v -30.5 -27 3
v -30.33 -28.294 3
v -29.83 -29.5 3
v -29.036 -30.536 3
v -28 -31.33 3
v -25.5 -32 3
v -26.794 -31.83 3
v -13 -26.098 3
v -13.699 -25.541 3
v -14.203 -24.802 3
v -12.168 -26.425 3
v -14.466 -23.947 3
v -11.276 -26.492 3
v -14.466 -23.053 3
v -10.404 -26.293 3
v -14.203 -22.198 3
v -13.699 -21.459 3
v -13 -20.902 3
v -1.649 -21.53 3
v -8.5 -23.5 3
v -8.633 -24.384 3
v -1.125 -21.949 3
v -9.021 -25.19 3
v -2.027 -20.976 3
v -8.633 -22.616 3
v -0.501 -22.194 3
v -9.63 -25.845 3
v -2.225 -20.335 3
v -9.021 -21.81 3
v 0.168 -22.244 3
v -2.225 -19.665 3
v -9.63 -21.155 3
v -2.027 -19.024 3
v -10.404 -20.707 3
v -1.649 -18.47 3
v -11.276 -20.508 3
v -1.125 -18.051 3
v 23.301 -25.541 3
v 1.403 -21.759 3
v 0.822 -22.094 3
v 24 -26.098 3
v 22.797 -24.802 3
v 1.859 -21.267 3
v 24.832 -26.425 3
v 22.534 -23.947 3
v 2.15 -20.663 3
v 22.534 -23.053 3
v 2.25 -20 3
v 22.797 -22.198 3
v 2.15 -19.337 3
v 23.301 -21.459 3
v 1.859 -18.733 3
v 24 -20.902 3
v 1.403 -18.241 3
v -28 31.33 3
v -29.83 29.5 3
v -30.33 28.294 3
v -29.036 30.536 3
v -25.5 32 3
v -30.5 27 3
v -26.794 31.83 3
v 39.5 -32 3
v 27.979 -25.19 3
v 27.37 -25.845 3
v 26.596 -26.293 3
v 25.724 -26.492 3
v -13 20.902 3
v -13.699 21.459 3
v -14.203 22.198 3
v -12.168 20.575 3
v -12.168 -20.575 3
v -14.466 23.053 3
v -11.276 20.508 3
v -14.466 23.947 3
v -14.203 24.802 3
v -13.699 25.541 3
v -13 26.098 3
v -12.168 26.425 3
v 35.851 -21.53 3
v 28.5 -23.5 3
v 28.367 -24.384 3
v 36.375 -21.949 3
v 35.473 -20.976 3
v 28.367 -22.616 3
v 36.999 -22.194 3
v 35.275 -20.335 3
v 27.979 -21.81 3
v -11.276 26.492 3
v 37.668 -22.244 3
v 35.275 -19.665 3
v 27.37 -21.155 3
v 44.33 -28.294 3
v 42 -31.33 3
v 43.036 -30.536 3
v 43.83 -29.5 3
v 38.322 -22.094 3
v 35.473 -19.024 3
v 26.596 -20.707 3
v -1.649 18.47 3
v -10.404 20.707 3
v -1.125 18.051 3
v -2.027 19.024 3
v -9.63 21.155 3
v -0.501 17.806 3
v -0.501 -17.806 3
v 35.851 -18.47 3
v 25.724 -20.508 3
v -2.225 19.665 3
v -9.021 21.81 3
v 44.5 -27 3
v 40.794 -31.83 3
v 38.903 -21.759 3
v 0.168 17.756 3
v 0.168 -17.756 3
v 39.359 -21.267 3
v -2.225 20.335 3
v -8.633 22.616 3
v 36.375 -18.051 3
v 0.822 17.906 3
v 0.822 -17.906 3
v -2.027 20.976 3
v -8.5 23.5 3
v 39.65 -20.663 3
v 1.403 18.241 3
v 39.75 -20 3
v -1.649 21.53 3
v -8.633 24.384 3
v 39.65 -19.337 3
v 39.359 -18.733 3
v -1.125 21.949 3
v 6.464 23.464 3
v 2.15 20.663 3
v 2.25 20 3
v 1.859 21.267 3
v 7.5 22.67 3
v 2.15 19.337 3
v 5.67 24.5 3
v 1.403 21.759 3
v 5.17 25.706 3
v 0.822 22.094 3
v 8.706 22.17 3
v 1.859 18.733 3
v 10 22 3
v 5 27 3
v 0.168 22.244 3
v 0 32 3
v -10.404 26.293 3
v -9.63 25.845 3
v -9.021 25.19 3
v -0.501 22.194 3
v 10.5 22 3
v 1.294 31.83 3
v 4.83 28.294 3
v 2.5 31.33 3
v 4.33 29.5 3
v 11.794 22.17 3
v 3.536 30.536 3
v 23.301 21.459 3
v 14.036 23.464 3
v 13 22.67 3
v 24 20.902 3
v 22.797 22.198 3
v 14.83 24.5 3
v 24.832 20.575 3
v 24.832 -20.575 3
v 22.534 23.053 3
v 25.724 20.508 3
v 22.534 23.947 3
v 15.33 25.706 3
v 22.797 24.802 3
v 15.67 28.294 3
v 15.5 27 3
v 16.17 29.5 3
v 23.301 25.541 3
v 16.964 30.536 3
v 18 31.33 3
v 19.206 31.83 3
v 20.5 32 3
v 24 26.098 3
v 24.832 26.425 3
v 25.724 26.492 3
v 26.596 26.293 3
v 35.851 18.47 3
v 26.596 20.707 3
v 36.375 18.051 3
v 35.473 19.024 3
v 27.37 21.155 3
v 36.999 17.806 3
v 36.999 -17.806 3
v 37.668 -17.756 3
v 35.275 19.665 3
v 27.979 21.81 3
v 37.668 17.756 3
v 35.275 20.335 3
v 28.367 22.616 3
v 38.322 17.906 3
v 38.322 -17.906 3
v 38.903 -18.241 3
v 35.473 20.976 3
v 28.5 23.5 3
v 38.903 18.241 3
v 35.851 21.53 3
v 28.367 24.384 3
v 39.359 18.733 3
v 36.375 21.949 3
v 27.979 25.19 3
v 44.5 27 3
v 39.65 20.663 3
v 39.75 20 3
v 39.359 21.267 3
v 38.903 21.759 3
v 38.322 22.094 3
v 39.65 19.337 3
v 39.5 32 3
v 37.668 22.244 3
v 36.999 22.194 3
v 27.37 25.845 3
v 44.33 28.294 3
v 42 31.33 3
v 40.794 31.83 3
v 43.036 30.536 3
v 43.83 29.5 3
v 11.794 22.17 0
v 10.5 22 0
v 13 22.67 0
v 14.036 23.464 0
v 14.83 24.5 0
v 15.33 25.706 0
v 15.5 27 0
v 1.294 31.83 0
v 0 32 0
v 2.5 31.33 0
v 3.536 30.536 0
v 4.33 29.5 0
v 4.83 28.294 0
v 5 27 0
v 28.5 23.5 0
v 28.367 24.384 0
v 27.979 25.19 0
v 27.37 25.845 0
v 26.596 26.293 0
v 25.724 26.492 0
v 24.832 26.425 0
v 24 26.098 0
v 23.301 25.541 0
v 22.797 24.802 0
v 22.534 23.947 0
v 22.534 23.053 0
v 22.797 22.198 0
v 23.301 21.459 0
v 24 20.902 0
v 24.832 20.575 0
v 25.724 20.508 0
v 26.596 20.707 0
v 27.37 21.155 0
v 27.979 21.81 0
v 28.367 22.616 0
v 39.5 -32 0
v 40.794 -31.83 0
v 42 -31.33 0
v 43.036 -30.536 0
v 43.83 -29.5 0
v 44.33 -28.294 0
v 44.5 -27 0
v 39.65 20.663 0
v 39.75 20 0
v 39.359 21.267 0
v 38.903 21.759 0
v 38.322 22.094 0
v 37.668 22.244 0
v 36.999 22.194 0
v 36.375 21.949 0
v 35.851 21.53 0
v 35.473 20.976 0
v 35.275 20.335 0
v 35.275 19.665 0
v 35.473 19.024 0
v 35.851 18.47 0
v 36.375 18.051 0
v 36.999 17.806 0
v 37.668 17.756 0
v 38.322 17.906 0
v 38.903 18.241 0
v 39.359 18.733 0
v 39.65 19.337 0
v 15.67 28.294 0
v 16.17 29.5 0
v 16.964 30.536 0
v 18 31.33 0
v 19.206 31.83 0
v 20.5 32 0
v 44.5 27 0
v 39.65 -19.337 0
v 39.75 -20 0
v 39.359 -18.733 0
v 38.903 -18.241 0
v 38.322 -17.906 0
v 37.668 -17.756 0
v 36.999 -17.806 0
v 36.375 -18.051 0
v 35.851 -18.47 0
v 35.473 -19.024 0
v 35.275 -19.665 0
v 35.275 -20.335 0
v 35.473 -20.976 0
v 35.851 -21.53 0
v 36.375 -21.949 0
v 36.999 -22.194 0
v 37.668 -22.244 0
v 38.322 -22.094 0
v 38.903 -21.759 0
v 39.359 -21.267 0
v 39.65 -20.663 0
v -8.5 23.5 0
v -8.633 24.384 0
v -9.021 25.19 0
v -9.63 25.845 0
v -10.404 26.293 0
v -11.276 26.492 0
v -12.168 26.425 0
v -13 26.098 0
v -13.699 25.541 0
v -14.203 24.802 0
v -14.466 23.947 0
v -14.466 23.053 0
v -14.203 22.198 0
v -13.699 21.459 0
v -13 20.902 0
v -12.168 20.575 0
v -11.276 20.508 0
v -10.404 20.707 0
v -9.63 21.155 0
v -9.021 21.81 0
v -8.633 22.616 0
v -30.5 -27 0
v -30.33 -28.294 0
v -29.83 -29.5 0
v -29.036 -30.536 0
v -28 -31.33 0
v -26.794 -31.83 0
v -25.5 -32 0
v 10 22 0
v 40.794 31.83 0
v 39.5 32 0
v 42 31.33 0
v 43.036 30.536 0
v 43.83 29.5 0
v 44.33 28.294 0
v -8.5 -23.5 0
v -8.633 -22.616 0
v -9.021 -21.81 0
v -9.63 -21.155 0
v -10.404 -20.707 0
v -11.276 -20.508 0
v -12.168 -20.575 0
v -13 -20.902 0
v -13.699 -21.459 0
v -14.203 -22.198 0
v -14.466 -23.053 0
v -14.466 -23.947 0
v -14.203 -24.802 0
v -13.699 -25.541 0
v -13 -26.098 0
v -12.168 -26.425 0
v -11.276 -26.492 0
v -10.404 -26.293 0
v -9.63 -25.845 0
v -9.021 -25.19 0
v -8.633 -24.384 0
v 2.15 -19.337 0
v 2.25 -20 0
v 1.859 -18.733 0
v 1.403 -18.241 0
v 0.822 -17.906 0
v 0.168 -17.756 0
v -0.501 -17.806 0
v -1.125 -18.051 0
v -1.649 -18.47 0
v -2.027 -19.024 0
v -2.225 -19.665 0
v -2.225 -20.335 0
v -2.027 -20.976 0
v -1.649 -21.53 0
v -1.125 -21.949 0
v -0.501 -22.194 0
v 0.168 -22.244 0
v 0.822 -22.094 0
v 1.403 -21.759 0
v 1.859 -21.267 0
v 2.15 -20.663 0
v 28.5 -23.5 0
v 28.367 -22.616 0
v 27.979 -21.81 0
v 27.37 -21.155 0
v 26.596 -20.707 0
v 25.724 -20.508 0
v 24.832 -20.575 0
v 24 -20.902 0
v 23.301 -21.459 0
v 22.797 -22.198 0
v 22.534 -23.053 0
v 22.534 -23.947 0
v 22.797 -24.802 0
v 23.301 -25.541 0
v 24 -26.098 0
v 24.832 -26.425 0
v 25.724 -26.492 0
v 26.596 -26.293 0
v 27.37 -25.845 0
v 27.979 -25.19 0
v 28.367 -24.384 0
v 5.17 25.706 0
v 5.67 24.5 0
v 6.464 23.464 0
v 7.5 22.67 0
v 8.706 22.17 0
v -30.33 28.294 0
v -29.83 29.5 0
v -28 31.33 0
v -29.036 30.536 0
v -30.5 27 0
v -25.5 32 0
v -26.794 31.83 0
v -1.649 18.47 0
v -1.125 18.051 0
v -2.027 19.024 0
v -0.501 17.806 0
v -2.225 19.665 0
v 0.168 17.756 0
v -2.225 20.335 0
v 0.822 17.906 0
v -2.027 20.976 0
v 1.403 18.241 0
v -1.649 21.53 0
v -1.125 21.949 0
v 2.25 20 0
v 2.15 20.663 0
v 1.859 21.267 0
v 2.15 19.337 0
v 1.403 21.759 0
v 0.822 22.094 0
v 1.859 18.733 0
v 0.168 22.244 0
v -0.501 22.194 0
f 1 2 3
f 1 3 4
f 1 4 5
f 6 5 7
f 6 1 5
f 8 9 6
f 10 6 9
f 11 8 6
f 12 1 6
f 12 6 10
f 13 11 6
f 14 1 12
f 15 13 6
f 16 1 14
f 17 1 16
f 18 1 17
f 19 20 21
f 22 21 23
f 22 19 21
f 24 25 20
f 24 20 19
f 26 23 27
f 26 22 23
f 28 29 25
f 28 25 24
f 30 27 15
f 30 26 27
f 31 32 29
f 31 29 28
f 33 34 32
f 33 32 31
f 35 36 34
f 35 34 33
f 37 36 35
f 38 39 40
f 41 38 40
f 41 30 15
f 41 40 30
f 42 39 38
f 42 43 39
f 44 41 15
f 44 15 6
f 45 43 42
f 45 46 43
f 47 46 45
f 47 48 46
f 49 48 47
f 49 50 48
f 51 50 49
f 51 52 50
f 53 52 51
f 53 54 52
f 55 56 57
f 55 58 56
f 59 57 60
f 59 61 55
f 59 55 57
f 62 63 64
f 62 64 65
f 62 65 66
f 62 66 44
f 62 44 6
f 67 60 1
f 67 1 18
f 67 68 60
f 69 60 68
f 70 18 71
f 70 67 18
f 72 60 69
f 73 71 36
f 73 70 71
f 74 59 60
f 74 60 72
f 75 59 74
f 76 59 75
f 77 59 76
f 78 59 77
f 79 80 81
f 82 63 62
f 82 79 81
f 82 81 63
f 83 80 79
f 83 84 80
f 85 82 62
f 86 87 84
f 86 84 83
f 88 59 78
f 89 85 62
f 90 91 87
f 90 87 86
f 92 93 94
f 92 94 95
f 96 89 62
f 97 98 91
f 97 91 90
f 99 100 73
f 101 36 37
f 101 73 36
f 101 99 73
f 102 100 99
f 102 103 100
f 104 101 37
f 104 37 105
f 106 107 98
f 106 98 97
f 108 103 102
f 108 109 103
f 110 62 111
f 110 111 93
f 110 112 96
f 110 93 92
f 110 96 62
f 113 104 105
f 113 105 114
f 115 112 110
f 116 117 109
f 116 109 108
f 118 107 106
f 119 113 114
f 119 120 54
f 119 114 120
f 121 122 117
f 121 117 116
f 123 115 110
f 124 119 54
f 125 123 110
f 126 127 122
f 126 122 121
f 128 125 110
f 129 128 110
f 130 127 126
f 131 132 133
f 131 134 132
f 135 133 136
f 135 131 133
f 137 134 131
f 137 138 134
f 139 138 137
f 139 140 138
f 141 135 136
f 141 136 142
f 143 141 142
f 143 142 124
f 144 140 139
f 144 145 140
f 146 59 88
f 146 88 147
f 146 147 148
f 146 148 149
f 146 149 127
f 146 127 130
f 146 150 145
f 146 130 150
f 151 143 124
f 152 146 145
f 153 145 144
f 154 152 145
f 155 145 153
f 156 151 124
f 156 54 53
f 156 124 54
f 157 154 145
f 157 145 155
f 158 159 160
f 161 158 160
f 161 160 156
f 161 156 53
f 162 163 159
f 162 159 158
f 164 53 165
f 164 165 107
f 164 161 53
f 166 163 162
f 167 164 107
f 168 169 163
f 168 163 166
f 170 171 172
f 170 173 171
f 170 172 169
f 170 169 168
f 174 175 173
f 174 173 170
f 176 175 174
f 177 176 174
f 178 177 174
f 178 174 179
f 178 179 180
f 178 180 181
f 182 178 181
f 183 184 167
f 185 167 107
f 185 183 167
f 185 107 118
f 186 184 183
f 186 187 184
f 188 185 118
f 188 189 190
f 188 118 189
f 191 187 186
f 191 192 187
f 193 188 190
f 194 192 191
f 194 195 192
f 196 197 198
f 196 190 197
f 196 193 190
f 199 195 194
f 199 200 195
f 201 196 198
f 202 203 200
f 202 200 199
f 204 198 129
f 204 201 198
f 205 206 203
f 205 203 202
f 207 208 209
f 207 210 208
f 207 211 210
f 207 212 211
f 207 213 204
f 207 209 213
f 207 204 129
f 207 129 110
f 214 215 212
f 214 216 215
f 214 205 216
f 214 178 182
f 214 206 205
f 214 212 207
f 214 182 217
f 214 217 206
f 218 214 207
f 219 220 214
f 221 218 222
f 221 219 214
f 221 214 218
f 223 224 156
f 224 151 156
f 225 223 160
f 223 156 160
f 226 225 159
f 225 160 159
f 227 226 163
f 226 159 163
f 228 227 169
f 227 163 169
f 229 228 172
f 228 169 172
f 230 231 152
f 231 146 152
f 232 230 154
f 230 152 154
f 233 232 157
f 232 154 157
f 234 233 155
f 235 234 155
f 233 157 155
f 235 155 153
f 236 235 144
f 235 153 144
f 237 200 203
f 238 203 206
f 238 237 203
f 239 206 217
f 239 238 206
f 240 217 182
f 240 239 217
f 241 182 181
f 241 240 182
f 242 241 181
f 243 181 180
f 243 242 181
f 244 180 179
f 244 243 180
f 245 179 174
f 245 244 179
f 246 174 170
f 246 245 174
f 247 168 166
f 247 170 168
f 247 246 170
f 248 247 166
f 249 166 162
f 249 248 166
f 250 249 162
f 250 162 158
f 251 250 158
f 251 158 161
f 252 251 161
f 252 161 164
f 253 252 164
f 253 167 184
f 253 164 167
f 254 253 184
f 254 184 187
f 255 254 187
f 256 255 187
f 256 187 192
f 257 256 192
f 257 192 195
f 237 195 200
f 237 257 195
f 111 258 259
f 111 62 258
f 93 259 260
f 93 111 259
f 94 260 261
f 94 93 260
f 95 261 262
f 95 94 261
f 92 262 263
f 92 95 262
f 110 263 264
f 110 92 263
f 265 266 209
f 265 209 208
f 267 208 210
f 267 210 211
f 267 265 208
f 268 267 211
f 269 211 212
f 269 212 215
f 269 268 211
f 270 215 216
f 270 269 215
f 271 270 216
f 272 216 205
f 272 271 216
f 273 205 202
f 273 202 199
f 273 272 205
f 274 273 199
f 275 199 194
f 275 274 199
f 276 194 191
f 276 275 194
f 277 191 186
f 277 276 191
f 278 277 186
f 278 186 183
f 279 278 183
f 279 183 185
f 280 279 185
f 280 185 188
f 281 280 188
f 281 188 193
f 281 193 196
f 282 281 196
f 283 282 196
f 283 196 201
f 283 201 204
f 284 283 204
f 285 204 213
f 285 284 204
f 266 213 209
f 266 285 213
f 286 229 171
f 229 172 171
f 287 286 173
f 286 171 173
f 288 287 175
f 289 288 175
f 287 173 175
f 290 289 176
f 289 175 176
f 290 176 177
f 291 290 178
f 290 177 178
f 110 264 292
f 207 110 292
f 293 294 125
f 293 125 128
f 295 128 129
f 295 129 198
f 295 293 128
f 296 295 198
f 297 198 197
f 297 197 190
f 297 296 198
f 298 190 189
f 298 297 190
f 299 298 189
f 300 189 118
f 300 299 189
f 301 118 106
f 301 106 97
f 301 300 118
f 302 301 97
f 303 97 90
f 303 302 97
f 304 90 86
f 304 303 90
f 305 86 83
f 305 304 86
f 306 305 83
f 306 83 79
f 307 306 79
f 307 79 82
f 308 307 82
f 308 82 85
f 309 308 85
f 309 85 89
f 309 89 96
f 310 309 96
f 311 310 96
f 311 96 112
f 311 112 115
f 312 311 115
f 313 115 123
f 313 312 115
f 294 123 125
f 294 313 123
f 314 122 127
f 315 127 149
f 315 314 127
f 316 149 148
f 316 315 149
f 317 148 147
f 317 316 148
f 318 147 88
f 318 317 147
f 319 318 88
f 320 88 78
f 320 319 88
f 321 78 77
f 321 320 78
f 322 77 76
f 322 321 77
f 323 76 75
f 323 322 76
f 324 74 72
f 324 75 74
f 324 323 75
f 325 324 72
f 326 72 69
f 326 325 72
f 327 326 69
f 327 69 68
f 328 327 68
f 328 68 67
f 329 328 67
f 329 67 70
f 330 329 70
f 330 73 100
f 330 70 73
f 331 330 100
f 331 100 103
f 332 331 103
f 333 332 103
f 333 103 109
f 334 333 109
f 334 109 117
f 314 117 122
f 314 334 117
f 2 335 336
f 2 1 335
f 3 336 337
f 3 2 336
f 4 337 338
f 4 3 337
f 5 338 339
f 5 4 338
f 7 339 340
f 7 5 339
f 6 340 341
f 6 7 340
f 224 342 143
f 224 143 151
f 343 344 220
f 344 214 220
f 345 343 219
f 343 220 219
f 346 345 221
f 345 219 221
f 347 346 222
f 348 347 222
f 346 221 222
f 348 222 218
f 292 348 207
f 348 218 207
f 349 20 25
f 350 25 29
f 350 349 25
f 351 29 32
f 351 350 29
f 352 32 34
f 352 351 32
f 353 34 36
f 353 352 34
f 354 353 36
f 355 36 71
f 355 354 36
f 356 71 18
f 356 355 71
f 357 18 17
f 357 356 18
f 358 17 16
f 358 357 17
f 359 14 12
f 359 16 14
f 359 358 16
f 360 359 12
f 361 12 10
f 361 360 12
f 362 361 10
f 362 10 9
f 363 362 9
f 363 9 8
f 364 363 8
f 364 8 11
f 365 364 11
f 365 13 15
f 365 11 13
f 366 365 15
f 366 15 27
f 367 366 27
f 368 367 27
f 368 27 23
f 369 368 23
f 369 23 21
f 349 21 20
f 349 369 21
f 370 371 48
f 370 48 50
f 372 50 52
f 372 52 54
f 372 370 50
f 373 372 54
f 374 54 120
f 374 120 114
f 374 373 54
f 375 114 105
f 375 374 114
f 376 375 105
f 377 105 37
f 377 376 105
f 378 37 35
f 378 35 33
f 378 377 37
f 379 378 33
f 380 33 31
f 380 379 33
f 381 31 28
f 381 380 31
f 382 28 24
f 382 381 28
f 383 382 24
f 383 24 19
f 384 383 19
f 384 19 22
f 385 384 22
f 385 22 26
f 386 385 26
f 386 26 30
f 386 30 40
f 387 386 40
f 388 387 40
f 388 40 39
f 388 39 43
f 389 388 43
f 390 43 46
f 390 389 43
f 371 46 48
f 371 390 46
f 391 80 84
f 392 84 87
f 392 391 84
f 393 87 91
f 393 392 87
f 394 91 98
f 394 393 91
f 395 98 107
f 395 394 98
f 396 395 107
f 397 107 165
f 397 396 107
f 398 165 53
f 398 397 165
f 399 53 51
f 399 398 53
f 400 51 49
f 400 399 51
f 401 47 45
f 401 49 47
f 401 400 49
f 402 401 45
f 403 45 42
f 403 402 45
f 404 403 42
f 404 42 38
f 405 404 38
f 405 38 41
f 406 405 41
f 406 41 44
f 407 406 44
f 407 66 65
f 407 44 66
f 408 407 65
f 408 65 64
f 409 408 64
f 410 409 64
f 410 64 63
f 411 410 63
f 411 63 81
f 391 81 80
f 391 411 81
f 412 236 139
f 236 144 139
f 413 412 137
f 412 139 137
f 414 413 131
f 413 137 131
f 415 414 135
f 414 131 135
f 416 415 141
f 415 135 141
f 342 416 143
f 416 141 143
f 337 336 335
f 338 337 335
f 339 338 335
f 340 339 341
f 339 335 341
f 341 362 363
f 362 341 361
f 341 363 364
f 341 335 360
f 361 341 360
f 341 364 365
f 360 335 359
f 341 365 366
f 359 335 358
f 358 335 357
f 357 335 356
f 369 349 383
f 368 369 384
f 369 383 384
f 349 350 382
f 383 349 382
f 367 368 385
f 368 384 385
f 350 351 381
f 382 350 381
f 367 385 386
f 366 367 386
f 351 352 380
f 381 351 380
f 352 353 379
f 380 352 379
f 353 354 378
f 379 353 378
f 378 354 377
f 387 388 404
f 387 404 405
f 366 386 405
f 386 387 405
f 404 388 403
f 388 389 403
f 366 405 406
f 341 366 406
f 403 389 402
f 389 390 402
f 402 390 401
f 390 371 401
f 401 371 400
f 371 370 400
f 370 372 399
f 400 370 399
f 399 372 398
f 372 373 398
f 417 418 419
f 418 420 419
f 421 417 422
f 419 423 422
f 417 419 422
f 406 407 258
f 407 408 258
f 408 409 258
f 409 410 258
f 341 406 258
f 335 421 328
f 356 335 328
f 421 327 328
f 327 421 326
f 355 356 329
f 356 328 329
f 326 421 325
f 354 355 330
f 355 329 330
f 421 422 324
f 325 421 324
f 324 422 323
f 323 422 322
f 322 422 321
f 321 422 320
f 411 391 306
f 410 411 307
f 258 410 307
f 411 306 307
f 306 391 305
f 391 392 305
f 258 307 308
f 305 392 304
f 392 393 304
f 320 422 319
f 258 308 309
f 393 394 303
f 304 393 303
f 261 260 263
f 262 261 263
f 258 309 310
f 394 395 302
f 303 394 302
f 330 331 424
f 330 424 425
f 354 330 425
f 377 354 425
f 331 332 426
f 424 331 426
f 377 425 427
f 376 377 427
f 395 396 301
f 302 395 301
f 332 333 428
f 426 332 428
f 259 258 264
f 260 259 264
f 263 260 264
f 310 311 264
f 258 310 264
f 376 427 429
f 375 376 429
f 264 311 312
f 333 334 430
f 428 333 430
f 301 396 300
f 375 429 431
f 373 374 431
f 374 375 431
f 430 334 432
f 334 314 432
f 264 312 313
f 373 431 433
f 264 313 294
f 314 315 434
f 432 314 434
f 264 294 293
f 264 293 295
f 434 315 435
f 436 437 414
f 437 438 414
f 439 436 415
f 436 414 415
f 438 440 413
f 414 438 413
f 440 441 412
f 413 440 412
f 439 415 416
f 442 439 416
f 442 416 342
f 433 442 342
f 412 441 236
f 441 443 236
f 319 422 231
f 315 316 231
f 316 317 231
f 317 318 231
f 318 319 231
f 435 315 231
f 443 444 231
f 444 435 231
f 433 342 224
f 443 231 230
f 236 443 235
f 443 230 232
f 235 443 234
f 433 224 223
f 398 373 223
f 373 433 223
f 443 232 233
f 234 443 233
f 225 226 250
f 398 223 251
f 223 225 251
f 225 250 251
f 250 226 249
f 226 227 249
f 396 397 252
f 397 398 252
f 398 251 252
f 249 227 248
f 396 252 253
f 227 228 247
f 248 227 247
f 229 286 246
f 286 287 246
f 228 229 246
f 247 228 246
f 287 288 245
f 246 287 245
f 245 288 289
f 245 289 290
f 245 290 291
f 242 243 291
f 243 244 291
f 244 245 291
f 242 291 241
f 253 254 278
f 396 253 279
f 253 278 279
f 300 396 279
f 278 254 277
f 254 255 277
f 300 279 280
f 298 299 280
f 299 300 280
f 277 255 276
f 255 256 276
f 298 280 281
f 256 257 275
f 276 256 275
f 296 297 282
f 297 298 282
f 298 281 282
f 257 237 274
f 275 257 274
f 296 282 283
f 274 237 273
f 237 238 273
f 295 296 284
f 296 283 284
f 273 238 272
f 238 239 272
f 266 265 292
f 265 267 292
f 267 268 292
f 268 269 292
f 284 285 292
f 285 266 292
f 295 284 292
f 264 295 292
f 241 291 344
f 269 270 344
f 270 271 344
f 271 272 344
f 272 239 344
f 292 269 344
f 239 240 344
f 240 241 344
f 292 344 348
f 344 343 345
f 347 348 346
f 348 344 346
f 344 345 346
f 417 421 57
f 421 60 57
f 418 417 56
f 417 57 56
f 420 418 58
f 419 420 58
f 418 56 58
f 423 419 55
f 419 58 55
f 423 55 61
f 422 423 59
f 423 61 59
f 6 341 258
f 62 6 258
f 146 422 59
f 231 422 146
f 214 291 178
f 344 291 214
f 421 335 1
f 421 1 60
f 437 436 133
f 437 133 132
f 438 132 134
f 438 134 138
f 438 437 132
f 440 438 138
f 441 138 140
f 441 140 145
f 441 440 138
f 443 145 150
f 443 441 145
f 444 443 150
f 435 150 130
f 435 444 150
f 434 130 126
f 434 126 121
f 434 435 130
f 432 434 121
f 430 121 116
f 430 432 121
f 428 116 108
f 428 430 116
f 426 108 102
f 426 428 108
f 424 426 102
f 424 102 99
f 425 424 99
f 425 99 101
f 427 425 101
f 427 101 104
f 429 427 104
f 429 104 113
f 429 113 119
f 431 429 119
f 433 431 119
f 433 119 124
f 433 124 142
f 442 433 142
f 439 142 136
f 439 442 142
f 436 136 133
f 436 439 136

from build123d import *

# Parameters (mm, degrees)
F1_W     = 75
F1_H     = 64
F1_R     = 2.25
F2_DEPTH = 3
F3_R     = 5
F4_R     = 3
F5_DEPTH = 25
F6_W     = 10.5
F6_H     = 12.9868694071
F7_DEPTH = 25
F8_R     = 4.99999


# Not quite as in the source:
# - a fillet or chamfer is up to 0.001 mm smaller than in the source, because OpenCascade refuses the exact size


with BuildPart() as f2:
    # F1 (on Top) → F2 (new body)
    with BuildSketch(Plane.XY):
        with Locations((7, 0)):
            Rectangle(F1_W, F1_H)
        with Locations((0, -20)):
            Circle(F1_R, mode=Mode.SUBTRACT)
        with Locations((37.5, -20)):
            Circle(F1_R, mode=Mode.SUBTRACT)
        with Locations((0, 20)):
            Circle(F1_R, mode=Mode.SUBTRACT)
        with Locations((37.5, 20)):
            Circle(F1_R, mode=Mode.SUBTRACT)
    extrude(amount=F2_DEPTH)

    # F3
    f3_edges = [f2.edges().sort_by_distance(p)[0] for p in [
        (-30.5, 32, 1.5),
        (-30.5, -32, 1.5),
        (44.5, -32, 1.5),
        (44.5, 32, 1.5),
    ]]
    fillet(f3_edges, radius=F3_R)

    # F4 (on Top) → F5 (cut)
    with BuildSketch(Plane.XY):
        with Locations((25.5, 23.5)):
            Circle(F4_R)
        with Locations((-11.5, 23.5)):
            Circle(F4_R)
        with Locations((25.5, -23.5)):
            Circle(F4_R)
        with Locations((-11.5, -23.5)):
            Circle(F4_R)
    extrude(amount=F5_DEPTH, mode=Mode.SUBTRACT)

    # F6 (on Top) → F7 (cut)
    with BuildSketch(Plane.XY):
        with Locations((10.25, 28.4934347035)):
            Rectangle(F6_W, F6_H)
    extrude(amount=F7_DEPTH, mode=Mode.SUBTRACT)

    # F8 (radius 5 in the source; OpenCascade refuses exactly that, so slightly less here)
    f8_edges = [f2.edges().sort_by_distance(p)[0] for p in [
        (5, 32, 1.5),
        (5, 22, 1.5),
        (15.5, 32, 1.5),
        (15.5, 22, 1.5),
    ]]
    fillet(f8_edges, radius=F8_R)


solid = f2.part
